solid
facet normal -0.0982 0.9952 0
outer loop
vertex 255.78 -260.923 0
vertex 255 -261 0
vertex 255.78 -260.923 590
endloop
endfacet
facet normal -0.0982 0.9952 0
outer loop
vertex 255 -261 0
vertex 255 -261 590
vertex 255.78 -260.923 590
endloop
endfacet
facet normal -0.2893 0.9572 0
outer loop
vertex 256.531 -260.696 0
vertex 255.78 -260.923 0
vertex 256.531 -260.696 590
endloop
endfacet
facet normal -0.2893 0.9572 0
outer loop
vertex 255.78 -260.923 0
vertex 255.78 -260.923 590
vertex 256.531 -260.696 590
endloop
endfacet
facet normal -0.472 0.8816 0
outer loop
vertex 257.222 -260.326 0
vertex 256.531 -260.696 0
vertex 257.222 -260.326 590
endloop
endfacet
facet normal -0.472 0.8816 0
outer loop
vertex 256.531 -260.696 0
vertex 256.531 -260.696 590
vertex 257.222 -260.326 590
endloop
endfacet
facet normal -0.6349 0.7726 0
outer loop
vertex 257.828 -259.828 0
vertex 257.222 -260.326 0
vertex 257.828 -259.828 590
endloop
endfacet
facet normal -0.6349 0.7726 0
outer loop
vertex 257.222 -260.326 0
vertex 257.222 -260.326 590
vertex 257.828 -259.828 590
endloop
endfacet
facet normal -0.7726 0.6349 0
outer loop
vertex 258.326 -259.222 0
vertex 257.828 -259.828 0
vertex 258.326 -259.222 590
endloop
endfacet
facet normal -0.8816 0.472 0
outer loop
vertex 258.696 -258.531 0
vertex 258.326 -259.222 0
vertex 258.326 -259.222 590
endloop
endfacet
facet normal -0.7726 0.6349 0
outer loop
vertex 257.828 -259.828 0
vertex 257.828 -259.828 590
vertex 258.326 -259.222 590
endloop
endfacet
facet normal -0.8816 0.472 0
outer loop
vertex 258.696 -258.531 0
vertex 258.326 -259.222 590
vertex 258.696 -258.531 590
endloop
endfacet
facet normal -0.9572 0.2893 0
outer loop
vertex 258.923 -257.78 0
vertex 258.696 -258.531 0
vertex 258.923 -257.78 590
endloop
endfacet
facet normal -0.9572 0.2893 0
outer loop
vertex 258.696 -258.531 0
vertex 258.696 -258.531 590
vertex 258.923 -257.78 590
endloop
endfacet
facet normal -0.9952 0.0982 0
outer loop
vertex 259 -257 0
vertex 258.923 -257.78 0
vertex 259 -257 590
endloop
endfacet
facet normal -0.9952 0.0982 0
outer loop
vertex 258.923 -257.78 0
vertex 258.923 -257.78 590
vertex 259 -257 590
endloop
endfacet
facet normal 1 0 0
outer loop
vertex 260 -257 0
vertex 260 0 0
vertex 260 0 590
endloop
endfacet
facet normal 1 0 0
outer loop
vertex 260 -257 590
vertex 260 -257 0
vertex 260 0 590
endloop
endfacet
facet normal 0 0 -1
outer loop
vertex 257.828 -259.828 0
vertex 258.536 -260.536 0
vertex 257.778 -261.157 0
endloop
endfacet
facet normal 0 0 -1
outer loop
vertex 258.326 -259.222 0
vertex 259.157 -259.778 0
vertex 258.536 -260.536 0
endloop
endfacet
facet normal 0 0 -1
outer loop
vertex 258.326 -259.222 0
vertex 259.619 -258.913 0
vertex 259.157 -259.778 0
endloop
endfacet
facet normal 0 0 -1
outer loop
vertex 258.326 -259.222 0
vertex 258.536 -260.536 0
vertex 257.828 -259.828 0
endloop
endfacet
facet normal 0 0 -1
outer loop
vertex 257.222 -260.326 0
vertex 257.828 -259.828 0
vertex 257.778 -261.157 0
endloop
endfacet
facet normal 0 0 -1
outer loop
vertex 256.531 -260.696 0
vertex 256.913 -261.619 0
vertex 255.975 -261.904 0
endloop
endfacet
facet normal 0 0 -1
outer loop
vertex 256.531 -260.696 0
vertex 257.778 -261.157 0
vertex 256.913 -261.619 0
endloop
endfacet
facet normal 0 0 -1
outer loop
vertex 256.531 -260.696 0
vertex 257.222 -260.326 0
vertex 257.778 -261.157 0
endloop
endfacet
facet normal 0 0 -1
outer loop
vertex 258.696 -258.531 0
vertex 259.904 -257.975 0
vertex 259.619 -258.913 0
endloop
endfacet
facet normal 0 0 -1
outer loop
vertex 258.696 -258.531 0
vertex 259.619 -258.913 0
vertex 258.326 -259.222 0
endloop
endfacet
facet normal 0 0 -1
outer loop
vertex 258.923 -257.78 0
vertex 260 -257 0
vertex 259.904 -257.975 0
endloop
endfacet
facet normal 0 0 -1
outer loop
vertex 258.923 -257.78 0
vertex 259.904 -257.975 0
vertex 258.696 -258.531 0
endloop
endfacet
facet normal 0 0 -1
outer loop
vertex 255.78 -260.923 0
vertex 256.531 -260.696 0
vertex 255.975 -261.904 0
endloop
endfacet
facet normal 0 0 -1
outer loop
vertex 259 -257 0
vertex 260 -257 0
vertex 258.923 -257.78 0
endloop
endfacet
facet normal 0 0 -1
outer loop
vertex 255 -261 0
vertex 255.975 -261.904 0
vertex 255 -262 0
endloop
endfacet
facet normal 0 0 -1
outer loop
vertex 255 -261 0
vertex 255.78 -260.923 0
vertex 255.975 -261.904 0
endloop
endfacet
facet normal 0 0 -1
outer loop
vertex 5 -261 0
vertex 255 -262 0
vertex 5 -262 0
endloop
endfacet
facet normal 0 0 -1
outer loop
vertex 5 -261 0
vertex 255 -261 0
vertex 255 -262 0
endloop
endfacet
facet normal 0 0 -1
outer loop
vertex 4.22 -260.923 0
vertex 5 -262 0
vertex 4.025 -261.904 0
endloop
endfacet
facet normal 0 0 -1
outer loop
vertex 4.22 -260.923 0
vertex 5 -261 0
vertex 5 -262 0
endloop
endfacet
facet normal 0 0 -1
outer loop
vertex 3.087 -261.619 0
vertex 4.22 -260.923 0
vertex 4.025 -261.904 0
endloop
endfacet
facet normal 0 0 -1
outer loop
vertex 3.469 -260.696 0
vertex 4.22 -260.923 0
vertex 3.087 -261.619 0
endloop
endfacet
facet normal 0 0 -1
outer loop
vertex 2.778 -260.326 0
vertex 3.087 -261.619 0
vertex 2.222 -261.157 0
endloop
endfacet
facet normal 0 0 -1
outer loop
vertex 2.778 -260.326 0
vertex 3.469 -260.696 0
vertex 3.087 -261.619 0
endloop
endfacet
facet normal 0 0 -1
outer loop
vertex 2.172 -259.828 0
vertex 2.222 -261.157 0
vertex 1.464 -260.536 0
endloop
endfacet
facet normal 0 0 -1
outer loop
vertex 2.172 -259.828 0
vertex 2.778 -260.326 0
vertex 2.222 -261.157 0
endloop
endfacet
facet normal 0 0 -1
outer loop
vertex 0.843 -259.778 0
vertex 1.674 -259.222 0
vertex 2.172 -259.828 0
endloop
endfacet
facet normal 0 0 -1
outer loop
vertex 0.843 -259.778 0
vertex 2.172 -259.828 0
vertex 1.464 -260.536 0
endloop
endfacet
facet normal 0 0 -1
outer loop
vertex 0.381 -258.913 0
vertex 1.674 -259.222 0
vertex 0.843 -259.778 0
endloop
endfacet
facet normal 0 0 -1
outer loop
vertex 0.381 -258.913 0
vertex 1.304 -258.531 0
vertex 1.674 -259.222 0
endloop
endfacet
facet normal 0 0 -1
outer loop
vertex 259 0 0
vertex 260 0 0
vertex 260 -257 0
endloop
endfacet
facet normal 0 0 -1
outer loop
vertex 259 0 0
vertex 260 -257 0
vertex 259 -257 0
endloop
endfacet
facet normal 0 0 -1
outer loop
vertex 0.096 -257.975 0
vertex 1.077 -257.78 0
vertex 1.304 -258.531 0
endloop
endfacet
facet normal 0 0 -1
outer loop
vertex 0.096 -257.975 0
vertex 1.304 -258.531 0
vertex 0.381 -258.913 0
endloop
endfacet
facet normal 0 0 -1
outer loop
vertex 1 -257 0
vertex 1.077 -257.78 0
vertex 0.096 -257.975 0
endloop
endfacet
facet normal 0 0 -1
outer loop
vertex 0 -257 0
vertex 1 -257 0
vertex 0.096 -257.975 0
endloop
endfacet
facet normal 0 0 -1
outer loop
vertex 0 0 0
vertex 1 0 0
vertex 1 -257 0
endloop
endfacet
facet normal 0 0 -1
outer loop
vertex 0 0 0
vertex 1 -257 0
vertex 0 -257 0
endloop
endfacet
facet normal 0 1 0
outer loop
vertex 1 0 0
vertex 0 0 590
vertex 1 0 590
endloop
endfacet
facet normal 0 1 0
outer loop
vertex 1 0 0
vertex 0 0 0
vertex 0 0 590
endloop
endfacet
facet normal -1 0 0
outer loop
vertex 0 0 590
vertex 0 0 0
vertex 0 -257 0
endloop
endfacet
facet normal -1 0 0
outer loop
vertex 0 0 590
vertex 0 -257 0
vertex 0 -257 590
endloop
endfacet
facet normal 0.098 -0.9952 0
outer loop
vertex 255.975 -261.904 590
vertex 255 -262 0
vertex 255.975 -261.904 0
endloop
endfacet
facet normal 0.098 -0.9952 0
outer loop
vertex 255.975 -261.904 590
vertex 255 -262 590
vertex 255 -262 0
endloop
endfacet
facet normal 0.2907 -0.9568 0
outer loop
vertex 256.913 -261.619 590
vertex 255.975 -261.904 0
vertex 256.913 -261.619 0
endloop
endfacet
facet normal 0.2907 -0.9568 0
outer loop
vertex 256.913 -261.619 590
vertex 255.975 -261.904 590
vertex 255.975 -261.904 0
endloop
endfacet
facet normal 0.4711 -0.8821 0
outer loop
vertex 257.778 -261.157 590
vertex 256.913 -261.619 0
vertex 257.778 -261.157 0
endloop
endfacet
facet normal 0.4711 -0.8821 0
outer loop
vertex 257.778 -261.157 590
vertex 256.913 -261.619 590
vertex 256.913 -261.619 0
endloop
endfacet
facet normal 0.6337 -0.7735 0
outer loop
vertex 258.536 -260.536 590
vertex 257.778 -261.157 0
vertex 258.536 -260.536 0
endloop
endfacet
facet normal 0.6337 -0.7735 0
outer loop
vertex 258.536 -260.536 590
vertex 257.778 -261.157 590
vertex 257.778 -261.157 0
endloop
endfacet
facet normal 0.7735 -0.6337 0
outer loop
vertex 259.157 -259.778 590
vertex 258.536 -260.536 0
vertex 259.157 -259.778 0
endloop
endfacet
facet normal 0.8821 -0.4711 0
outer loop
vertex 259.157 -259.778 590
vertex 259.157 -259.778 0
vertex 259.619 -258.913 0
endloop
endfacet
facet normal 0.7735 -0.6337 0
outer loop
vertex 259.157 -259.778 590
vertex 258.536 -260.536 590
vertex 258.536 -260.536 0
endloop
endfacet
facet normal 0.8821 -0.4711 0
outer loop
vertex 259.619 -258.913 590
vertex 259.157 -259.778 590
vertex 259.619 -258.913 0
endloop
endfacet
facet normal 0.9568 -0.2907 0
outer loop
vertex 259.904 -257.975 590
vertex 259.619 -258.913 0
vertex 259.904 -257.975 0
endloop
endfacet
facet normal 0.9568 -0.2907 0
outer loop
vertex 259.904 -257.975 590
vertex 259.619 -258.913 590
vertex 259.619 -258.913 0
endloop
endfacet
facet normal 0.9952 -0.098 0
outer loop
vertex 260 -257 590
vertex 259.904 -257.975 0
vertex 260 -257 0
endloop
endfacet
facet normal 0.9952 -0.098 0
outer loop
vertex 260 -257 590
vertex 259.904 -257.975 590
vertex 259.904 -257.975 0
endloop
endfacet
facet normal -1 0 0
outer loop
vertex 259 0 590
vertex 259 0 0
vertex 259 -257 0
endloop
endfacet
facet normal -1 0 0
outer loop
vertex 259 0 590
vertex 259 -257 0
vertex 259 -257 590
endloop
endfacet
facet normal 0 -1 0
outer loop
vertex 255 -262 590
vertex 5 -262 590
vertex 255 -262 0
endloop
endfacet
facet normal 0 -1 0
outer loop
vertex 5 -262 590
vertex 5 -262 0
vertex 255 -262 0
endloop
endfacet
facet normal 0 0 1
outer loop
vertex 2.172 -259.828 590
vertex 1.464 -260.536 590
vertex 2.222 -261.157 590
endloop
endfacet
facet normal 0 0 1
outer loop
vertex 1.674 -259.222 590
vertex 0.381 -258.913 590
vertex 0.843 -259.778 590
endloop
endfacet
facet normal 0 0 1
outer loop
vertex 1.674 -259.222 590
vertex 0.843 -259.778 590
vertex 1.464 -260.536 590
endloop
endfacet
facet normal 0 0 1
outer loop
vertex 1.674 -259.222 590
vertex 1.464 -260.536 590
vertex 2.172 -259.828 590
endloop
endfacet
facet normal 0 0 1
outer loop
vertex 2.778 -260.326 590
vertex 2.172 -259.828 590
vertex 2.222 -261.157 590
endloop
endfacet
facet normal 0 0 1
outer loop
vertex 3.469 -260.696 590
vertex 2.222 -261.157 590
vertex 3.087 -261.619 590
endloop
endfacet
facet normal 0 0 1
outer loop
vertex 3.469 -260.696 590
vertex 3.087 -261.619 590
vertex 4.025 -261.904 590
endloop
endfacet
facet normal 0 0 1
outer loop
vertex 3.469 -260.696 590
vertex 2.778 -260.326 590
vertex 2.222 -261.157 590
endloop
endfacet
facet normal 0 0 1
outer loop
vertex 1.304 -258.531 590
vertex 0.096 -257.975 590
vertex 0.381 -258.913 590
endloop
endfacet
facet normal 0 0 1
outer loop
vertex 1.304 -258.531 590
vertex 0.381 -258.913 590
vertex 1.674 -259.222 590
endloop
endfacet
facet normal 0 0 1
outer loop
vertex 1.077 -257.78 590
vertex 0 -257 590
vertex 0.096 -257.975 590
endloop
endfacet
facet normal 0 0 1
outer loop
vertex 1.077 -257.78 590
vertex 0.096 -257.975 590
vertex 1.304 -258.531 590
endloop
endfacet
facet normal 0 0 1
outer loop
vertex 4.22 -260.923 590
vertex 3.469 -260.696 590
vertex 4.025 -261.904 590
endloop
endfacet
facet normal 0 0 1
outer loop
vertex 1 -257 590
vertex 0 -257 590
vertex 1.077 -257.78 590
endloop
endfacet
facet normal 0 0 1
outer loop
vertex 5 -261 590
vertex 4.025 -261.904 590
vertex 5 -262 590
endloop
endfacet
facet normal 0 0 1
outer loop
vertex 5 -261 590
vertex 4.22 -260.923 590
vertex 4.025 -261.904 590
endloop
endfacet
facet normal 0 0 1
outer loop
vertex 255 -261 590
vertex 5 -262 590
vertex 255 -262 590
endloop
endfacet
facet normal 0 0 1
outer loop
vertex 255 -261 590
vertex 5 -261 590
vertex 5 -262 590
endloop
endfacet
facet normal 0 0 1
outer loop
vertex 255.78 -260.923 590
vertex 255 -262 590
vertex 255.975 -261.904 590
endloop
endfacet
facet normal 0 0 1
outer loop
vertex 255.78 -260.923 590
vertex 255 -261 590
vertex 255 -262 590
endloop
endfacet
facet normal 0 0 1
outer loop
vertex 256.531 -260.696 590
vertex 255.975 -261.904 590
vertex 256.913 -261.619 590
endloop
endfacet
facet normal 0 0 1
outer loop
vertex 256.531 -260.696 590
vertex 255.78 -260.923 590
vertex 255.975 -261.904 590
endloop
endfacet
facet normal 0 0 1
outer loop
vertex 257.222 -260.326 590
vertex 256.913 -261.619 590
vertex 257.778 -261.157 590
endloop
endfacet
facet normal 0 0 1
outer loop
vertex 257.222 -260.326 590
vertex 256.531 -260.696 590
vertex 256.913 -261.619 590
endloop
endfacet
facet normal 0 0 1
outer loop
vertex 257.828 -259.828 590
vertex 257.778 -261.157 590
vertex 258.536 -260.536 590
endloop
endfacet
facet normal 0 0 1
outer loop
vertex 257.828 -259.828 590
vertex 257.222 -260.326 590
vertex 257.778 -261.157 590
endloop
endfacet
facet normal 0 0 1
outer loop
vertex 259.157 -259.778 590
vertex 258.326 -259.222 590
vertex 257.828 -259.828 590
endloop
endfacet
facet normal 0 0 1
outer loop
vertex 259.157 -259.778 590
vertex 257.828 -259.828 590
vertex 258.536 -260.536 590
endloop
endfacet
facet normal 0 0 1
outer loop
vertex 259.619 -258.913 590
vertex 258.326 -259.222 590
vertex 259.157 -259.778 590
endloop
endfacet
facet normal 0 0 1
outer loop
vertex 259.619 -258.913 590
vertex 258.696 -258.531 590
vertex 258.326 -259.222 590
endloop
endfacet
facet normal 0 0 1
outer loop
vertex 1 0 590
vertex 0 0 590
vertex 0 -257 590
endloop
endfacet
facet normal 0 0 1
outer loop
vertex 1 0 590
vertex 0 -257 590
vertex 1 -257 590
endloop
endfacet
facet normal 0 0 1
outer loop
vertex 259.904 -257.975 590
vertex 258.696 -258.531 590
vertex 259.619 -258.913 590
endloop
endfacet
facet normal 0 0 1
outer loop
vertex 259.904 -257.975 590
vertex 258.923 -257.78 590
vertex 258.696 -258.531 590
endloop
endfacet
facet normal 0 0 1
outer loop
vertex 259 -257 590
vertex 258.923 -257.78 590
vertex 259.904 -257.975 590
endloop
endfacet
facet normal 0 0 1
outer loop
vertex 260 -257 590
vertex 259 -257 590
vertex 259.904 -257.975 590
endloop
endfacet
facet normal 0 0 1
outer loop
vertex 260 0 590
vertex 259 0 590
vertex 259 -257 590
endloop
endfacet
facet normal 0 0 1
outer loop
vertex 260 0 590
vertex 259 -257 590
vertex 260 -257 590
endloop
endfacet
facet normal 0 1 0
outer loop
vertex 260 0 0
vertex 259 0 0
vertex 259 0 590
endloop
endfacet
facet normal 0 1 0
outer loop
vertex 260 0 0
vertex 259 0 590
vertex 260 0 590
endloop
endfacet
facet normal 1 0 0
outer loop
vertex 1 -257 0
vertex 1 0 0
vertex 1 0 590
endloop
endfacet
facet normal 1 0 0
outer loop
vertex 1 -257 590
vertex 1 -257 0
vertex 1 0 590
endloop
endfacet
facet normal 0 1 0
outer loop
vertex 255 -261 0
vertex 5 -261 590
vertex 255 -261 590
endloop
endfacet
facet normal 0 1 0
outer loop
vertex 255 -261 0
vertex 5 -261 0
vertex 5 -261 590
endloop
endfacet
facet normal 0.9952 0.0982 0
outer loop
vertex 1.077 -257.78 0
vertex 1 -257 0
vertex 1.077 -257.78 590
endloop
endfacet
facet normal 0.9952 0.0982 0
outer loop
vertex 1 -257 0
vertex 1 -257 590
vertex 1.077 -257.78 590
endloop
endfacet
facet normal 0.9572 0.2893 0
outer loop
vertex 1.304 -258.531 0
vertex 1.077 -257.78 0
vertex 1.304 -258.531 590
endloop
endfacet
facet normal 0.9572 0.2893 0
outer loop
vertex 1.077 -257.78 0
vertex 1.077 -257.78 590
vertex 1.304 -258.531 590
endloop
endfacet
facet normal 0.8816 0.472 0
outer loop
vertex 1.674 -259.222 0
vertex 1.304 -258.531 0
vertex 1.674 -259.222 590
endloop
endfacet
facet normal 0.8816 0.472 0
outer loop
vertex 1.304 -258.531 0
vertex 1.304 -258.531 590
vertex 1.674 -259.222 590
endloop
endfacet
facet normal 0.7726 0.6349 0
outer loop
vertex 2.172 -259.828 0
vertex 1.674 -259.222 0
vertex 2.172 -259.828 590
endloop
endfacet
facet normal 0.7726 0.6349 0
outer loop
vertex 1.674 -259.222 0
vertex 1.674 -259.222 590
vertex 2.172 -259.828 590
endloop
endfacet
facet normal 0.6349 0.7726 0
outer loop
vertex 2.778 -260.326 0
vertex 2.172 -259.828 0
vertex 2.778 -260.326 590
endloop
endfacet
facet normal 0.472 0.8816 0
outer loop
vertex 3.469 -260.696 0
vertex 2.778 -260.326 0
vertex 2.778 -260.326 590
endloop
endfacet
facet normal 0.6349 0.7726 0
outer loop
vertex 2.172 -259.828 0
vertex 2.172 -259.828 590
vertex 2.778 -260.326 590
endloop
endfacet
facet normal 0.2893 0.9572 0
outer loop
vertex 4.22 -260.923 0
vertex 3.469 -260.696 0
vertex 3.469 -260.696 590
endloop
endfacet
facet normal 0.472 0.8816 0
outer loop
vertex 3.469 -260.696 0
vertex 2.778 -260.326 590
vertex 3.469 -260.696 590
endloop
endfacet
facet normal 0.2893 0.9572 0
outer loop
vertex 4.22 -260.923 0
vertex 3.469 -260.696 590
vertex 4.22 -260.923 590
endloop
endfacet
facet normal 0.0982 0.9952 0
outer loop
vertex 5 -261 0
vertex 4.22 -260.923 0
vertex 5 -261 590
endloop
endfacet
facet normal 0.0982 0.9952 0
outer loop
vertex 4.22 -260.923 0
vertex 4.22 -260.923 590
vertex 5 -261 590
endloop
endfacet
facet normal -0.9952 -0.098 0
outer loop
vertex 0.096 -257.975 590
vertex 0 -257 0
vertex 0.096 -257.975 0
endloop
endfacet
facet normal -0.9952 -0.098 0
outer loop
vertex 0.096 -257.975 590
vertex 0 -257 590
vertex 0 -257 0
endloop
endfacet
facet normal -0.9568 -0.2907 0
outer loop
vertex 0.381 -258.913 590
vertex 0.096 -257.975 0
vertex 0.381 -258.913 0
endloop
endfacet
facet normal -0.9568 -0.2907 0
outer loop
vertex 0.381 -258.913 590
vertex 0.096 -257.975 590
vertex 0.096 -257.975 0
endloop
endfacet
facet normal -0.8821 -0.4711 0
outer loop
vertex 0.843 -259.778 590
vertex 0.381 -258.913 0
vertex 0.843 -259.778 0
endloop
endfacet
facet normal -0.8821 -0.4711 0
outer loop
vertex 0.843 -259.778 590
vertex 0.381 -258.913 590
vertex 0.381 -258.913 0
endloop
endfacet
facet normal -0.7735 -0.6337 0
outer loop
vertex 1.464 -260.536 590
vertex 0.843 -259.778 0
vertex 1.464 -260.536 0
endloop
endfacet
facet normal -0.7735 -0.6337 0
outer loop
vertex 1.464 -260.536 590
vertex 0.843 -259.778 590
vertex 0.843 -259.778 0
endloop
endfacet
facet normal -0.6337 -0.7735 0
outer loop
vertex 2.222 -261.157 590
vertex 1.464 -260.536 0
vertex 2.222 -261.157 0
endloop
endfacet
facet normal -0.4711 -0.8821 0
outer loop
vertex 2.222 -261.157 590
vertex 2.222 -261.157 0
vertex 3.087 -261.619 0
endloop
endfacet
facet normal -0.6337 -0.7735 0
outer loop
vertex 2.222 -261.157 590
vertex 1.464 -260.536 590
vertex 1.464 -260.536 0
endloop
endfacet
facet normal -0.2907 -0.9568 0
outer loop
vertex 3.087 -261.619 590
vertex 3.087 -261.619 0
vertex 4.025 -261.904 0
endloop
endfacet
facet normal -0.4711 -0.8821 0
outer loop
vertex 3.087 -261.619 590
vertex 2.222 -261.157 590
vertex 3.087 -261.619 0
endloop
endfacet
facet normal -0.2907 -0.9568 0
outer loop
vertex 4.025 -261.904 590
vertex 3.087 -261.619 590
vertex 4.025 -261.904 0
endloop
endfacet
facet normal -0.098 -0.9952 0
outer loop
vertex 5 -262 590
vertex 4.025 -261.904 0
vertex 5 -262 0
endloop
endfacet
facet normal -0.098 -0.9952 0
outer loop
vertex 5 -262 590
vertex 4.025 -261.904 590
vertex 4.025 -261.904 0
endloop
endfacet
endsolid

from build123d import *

# Parameters (mm, degrees)
F0_W     = 60.5891123414
F0_H     = 39.380852133
F1_DEPTH = 590
F2_DEPTH = 260
F3_DEPTH = 262
F4_R     = 5
F5_T     = -1


with BuildPart() as f1:
    # F0 (on Top) → F1 (new body)
    with BuildSketch(Plane.XY):
        with Locations((30.2945561707, -19.6904260665)):
            Rectangle(F0_W, F0_H)
    extrude(amount=F1_DEPTH)

    # F2 (add): a face of the model
    f2_faces = [f1.faces().sort_by_distance(p)[0] for p in [
        (0, -19.6904260665, 295),
    ]]
    extrude(f2_faces, amount=-F2_DEPTH)

    # F3 (add): a face of the model
    f3_faces = [f1.faces().sort_by_distance(p)[0] for p in [
        (130, 0, 295),
    ]]
    extrude(f3_faces, amount=-F3_DEPTH)

    # F4
    f4_edges = [f1.edges().sort_by_distance(p)[0] for p in [
        (0, -262, 295),
        (260, -262, 295),
    ]]
    fillet(f4_edges, radius=F4_R)

    # F5
    f5_openings = [f1.faces().sort_by_distance(p)[0] for p in [
        (130, -130.979538, 590),
        (130, 0, 295),
        (130, -130.979538, 0),
    ]]
    offset(amount=F5_T, openings=f5_openings)


solid = f1.part
